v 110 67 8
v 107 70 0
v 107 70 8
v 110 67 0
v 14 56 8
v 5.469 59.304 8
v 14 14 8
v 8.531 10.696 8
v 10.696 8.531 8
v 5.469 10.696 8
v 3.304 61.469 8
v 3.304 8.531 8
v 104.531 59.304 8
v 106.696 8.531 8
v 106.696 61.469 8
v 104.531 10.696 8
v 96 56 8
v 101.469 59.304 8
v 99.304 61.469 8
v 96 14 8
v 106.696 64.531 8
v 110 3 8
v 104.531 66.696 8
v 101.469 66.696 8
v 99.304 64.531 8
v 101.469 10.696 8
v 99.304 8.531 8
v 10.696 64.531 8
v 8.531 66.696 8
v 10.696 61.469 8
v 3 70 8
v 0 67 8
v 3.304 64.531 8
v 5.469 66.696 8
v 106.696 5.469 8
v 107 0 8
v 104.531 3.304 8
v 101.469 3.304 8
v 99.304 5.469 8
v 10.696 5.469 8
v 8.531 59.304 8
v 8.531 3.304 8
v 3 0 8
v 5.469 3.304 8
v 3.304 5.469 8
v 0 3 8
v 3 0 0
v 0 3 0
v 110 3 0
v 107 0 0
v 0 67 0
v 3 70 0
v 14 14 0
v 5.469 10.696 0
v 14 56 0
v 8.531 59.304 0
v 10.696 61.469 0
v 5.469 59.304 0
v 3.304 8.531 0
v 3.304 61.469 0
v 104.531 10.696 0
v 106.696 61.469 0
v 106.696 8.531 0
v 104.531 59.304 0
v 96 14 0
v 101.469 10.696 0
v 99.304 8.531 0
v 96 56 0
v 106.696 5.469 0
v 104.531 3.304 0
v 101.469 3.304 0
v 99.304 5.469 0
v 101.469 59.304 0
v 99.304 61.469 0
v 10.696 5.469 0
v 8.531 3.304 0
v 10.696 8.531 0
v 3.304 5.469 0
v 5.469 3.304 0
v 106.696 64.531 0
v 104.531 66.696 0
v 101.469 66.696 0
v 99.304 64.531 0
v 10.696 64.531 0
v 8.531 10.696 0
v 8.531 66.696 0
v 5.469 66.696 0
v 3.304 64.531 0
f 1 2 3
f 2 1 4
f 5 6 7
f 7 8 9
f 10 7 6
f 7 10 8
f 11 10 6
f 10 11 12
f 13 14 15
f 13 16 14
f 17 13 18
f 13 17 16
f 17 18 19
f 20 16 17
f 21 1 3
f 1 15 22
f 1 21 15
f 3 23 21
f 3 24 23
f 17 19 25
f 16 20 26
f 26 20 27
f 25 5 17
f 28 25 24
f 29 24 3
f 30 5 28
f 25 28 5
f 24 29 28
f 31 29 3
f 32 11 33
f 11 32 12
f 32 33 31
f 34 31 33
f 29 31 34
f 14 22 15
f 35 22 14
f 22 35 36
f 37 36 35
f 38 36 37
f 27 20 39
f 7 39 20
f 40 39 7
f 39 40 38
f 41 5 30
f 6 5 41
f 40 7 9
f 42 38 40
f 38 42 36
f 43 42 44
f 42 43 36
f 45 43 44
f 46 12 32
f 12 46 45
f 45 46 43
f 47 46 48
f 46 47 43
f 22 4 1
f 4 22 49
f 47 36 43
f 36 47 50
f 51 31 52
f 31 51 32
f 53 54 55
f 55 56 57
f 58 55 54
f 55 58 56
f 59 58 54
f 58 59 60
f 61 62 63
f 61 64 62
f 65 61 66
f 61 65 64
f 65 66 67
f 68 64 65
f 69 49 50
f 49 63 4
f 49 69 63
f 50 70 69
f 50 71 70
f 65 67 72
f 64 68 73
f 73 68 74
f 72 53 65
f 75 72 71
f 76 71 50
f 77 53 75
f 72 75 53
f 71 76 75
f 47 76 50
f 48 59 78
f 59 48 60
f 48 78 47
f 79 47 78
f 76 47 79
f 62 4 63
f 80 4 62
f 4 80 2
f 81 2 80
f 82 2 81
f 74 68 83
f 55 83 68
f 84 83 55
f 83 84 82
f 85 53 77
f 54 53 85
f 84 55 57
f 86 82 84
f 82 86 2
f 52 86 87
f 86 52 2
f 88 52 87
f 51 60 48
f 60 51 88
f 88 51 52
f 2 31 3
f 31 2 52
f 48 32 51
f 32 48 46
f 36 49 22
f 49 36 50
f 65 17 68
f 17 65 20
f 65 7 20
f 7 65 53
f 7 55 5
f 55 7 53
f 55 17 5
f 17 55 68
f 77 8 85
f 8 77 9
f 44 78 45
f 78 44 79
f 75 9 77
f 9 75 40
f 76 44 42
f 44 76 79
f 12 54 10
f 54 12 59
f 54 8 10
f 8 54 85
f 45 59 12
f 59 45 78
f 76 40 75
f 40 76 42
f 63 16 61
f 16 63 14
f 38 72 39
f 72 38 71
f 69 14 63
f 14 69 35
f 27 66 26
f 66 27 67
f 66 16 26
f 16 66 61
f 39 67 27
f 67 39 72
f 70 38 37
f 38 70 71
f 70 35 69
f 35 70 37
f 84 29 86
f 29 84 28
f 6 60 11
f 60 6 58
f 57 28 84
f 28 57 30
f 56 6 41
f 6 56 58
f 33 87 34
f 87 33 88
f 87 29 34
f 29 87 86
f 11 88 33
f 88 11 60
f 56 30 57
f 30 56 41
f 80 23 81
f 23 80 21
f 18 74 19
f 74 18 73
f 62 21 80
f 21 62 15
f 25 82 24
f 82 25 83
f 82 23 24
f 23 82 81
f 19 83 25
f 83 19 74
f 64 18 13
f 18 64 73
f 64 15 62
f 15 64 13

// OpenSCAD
$fn = 32;

// ----------------------------------------------------------------------
// Frame plate: 110 x 70 frame, 14 mm rails
// ----------------------------------------------------------------------

// --- parameters (mm) ---
plate_l = 110;            // plate length, X
plate_w = 70;             // plate width, Y
plate_t = 8;              // plate thickness, Z (extrusion height)
corner_c = 3;             // corner chamfer
frame_bar = 14;           // frame rail width
bolt_r = 4;               // corner bolt window radius
bolt_inset = 7;           // bolt centre inset from the edges

win_l = plate_l - 2 * frame_bar;  // window length
win_w = plate_w - 2 * frame_bar;  // window width
bolt_d = 2 * bolt_r;  // corner hole diameter

profile = [[3, 0], [107, 0], [110, 3], [110, 67], [107, 70], [3, 70], [0, 67], [0, 3]];  // primary outline, 8 points, counter clockwise
void_1 = [[14, 14], [96, 14], [96, 56], [14, 56]];  // the window, 4 points
void_2 = [[10.696, 8.531], [8.531, 10.696], [5.469, 10.696], [3.304, 8.531], [3.304, 5.469], [5.469, 3.304], [8.531, 3.304], [10.696, 5.469]];  // corner bolt window, 8 points
void_3 = [[106.696, 8.531], [104.531, 10.696], [101.469, 10.696], [99.304, 8.531], [99.304, 5.469], [101.469, 3.304], [104.531, 3.304], [106.696, 5.469]];  // corner bolt window, 8 points
void_4 = [[10.696, 64.531], [8.531, 66.696], [5.469, 66.696], [3.304, 64.531], [3.304, 61.469], [5.469, 59.304], [8.531, 59.304], [10.696, 61.469]];  // corner bolt window, 8 points
void_5 = [[106.696, 64.531], [104.531, 66.696], [101.469, 66.696], [99.304, 64.531], [99.304, 61.469], [101.469, 59.304], [104.531, 59.304], [106.696, 61.469]];  // corner bolt window, 8 points

// --- the one profile operation ---
difference() {
  linear_extrude(height = plate_t) polygon(points = profile);
  translate([0, 0, -1])
    linear_extrude(height = plate_t + 2) polygon(points = void_1);
  translate([0, 0, -1])
    linear_extrude(height = plate_t + 2) polygon(points = void_2);
  translate([0, 0, -1])
    linear_extrude(height = plate_t + 2) polygon(points = void_3);
  translate([0, 0, -1])
    linear_extrude(height = plate_t + 2) polygon(points = void_4);
  translate([0, 0, -1])
    linear_extrude(height = plate_t + 2) polygon(points = void_5);
}
